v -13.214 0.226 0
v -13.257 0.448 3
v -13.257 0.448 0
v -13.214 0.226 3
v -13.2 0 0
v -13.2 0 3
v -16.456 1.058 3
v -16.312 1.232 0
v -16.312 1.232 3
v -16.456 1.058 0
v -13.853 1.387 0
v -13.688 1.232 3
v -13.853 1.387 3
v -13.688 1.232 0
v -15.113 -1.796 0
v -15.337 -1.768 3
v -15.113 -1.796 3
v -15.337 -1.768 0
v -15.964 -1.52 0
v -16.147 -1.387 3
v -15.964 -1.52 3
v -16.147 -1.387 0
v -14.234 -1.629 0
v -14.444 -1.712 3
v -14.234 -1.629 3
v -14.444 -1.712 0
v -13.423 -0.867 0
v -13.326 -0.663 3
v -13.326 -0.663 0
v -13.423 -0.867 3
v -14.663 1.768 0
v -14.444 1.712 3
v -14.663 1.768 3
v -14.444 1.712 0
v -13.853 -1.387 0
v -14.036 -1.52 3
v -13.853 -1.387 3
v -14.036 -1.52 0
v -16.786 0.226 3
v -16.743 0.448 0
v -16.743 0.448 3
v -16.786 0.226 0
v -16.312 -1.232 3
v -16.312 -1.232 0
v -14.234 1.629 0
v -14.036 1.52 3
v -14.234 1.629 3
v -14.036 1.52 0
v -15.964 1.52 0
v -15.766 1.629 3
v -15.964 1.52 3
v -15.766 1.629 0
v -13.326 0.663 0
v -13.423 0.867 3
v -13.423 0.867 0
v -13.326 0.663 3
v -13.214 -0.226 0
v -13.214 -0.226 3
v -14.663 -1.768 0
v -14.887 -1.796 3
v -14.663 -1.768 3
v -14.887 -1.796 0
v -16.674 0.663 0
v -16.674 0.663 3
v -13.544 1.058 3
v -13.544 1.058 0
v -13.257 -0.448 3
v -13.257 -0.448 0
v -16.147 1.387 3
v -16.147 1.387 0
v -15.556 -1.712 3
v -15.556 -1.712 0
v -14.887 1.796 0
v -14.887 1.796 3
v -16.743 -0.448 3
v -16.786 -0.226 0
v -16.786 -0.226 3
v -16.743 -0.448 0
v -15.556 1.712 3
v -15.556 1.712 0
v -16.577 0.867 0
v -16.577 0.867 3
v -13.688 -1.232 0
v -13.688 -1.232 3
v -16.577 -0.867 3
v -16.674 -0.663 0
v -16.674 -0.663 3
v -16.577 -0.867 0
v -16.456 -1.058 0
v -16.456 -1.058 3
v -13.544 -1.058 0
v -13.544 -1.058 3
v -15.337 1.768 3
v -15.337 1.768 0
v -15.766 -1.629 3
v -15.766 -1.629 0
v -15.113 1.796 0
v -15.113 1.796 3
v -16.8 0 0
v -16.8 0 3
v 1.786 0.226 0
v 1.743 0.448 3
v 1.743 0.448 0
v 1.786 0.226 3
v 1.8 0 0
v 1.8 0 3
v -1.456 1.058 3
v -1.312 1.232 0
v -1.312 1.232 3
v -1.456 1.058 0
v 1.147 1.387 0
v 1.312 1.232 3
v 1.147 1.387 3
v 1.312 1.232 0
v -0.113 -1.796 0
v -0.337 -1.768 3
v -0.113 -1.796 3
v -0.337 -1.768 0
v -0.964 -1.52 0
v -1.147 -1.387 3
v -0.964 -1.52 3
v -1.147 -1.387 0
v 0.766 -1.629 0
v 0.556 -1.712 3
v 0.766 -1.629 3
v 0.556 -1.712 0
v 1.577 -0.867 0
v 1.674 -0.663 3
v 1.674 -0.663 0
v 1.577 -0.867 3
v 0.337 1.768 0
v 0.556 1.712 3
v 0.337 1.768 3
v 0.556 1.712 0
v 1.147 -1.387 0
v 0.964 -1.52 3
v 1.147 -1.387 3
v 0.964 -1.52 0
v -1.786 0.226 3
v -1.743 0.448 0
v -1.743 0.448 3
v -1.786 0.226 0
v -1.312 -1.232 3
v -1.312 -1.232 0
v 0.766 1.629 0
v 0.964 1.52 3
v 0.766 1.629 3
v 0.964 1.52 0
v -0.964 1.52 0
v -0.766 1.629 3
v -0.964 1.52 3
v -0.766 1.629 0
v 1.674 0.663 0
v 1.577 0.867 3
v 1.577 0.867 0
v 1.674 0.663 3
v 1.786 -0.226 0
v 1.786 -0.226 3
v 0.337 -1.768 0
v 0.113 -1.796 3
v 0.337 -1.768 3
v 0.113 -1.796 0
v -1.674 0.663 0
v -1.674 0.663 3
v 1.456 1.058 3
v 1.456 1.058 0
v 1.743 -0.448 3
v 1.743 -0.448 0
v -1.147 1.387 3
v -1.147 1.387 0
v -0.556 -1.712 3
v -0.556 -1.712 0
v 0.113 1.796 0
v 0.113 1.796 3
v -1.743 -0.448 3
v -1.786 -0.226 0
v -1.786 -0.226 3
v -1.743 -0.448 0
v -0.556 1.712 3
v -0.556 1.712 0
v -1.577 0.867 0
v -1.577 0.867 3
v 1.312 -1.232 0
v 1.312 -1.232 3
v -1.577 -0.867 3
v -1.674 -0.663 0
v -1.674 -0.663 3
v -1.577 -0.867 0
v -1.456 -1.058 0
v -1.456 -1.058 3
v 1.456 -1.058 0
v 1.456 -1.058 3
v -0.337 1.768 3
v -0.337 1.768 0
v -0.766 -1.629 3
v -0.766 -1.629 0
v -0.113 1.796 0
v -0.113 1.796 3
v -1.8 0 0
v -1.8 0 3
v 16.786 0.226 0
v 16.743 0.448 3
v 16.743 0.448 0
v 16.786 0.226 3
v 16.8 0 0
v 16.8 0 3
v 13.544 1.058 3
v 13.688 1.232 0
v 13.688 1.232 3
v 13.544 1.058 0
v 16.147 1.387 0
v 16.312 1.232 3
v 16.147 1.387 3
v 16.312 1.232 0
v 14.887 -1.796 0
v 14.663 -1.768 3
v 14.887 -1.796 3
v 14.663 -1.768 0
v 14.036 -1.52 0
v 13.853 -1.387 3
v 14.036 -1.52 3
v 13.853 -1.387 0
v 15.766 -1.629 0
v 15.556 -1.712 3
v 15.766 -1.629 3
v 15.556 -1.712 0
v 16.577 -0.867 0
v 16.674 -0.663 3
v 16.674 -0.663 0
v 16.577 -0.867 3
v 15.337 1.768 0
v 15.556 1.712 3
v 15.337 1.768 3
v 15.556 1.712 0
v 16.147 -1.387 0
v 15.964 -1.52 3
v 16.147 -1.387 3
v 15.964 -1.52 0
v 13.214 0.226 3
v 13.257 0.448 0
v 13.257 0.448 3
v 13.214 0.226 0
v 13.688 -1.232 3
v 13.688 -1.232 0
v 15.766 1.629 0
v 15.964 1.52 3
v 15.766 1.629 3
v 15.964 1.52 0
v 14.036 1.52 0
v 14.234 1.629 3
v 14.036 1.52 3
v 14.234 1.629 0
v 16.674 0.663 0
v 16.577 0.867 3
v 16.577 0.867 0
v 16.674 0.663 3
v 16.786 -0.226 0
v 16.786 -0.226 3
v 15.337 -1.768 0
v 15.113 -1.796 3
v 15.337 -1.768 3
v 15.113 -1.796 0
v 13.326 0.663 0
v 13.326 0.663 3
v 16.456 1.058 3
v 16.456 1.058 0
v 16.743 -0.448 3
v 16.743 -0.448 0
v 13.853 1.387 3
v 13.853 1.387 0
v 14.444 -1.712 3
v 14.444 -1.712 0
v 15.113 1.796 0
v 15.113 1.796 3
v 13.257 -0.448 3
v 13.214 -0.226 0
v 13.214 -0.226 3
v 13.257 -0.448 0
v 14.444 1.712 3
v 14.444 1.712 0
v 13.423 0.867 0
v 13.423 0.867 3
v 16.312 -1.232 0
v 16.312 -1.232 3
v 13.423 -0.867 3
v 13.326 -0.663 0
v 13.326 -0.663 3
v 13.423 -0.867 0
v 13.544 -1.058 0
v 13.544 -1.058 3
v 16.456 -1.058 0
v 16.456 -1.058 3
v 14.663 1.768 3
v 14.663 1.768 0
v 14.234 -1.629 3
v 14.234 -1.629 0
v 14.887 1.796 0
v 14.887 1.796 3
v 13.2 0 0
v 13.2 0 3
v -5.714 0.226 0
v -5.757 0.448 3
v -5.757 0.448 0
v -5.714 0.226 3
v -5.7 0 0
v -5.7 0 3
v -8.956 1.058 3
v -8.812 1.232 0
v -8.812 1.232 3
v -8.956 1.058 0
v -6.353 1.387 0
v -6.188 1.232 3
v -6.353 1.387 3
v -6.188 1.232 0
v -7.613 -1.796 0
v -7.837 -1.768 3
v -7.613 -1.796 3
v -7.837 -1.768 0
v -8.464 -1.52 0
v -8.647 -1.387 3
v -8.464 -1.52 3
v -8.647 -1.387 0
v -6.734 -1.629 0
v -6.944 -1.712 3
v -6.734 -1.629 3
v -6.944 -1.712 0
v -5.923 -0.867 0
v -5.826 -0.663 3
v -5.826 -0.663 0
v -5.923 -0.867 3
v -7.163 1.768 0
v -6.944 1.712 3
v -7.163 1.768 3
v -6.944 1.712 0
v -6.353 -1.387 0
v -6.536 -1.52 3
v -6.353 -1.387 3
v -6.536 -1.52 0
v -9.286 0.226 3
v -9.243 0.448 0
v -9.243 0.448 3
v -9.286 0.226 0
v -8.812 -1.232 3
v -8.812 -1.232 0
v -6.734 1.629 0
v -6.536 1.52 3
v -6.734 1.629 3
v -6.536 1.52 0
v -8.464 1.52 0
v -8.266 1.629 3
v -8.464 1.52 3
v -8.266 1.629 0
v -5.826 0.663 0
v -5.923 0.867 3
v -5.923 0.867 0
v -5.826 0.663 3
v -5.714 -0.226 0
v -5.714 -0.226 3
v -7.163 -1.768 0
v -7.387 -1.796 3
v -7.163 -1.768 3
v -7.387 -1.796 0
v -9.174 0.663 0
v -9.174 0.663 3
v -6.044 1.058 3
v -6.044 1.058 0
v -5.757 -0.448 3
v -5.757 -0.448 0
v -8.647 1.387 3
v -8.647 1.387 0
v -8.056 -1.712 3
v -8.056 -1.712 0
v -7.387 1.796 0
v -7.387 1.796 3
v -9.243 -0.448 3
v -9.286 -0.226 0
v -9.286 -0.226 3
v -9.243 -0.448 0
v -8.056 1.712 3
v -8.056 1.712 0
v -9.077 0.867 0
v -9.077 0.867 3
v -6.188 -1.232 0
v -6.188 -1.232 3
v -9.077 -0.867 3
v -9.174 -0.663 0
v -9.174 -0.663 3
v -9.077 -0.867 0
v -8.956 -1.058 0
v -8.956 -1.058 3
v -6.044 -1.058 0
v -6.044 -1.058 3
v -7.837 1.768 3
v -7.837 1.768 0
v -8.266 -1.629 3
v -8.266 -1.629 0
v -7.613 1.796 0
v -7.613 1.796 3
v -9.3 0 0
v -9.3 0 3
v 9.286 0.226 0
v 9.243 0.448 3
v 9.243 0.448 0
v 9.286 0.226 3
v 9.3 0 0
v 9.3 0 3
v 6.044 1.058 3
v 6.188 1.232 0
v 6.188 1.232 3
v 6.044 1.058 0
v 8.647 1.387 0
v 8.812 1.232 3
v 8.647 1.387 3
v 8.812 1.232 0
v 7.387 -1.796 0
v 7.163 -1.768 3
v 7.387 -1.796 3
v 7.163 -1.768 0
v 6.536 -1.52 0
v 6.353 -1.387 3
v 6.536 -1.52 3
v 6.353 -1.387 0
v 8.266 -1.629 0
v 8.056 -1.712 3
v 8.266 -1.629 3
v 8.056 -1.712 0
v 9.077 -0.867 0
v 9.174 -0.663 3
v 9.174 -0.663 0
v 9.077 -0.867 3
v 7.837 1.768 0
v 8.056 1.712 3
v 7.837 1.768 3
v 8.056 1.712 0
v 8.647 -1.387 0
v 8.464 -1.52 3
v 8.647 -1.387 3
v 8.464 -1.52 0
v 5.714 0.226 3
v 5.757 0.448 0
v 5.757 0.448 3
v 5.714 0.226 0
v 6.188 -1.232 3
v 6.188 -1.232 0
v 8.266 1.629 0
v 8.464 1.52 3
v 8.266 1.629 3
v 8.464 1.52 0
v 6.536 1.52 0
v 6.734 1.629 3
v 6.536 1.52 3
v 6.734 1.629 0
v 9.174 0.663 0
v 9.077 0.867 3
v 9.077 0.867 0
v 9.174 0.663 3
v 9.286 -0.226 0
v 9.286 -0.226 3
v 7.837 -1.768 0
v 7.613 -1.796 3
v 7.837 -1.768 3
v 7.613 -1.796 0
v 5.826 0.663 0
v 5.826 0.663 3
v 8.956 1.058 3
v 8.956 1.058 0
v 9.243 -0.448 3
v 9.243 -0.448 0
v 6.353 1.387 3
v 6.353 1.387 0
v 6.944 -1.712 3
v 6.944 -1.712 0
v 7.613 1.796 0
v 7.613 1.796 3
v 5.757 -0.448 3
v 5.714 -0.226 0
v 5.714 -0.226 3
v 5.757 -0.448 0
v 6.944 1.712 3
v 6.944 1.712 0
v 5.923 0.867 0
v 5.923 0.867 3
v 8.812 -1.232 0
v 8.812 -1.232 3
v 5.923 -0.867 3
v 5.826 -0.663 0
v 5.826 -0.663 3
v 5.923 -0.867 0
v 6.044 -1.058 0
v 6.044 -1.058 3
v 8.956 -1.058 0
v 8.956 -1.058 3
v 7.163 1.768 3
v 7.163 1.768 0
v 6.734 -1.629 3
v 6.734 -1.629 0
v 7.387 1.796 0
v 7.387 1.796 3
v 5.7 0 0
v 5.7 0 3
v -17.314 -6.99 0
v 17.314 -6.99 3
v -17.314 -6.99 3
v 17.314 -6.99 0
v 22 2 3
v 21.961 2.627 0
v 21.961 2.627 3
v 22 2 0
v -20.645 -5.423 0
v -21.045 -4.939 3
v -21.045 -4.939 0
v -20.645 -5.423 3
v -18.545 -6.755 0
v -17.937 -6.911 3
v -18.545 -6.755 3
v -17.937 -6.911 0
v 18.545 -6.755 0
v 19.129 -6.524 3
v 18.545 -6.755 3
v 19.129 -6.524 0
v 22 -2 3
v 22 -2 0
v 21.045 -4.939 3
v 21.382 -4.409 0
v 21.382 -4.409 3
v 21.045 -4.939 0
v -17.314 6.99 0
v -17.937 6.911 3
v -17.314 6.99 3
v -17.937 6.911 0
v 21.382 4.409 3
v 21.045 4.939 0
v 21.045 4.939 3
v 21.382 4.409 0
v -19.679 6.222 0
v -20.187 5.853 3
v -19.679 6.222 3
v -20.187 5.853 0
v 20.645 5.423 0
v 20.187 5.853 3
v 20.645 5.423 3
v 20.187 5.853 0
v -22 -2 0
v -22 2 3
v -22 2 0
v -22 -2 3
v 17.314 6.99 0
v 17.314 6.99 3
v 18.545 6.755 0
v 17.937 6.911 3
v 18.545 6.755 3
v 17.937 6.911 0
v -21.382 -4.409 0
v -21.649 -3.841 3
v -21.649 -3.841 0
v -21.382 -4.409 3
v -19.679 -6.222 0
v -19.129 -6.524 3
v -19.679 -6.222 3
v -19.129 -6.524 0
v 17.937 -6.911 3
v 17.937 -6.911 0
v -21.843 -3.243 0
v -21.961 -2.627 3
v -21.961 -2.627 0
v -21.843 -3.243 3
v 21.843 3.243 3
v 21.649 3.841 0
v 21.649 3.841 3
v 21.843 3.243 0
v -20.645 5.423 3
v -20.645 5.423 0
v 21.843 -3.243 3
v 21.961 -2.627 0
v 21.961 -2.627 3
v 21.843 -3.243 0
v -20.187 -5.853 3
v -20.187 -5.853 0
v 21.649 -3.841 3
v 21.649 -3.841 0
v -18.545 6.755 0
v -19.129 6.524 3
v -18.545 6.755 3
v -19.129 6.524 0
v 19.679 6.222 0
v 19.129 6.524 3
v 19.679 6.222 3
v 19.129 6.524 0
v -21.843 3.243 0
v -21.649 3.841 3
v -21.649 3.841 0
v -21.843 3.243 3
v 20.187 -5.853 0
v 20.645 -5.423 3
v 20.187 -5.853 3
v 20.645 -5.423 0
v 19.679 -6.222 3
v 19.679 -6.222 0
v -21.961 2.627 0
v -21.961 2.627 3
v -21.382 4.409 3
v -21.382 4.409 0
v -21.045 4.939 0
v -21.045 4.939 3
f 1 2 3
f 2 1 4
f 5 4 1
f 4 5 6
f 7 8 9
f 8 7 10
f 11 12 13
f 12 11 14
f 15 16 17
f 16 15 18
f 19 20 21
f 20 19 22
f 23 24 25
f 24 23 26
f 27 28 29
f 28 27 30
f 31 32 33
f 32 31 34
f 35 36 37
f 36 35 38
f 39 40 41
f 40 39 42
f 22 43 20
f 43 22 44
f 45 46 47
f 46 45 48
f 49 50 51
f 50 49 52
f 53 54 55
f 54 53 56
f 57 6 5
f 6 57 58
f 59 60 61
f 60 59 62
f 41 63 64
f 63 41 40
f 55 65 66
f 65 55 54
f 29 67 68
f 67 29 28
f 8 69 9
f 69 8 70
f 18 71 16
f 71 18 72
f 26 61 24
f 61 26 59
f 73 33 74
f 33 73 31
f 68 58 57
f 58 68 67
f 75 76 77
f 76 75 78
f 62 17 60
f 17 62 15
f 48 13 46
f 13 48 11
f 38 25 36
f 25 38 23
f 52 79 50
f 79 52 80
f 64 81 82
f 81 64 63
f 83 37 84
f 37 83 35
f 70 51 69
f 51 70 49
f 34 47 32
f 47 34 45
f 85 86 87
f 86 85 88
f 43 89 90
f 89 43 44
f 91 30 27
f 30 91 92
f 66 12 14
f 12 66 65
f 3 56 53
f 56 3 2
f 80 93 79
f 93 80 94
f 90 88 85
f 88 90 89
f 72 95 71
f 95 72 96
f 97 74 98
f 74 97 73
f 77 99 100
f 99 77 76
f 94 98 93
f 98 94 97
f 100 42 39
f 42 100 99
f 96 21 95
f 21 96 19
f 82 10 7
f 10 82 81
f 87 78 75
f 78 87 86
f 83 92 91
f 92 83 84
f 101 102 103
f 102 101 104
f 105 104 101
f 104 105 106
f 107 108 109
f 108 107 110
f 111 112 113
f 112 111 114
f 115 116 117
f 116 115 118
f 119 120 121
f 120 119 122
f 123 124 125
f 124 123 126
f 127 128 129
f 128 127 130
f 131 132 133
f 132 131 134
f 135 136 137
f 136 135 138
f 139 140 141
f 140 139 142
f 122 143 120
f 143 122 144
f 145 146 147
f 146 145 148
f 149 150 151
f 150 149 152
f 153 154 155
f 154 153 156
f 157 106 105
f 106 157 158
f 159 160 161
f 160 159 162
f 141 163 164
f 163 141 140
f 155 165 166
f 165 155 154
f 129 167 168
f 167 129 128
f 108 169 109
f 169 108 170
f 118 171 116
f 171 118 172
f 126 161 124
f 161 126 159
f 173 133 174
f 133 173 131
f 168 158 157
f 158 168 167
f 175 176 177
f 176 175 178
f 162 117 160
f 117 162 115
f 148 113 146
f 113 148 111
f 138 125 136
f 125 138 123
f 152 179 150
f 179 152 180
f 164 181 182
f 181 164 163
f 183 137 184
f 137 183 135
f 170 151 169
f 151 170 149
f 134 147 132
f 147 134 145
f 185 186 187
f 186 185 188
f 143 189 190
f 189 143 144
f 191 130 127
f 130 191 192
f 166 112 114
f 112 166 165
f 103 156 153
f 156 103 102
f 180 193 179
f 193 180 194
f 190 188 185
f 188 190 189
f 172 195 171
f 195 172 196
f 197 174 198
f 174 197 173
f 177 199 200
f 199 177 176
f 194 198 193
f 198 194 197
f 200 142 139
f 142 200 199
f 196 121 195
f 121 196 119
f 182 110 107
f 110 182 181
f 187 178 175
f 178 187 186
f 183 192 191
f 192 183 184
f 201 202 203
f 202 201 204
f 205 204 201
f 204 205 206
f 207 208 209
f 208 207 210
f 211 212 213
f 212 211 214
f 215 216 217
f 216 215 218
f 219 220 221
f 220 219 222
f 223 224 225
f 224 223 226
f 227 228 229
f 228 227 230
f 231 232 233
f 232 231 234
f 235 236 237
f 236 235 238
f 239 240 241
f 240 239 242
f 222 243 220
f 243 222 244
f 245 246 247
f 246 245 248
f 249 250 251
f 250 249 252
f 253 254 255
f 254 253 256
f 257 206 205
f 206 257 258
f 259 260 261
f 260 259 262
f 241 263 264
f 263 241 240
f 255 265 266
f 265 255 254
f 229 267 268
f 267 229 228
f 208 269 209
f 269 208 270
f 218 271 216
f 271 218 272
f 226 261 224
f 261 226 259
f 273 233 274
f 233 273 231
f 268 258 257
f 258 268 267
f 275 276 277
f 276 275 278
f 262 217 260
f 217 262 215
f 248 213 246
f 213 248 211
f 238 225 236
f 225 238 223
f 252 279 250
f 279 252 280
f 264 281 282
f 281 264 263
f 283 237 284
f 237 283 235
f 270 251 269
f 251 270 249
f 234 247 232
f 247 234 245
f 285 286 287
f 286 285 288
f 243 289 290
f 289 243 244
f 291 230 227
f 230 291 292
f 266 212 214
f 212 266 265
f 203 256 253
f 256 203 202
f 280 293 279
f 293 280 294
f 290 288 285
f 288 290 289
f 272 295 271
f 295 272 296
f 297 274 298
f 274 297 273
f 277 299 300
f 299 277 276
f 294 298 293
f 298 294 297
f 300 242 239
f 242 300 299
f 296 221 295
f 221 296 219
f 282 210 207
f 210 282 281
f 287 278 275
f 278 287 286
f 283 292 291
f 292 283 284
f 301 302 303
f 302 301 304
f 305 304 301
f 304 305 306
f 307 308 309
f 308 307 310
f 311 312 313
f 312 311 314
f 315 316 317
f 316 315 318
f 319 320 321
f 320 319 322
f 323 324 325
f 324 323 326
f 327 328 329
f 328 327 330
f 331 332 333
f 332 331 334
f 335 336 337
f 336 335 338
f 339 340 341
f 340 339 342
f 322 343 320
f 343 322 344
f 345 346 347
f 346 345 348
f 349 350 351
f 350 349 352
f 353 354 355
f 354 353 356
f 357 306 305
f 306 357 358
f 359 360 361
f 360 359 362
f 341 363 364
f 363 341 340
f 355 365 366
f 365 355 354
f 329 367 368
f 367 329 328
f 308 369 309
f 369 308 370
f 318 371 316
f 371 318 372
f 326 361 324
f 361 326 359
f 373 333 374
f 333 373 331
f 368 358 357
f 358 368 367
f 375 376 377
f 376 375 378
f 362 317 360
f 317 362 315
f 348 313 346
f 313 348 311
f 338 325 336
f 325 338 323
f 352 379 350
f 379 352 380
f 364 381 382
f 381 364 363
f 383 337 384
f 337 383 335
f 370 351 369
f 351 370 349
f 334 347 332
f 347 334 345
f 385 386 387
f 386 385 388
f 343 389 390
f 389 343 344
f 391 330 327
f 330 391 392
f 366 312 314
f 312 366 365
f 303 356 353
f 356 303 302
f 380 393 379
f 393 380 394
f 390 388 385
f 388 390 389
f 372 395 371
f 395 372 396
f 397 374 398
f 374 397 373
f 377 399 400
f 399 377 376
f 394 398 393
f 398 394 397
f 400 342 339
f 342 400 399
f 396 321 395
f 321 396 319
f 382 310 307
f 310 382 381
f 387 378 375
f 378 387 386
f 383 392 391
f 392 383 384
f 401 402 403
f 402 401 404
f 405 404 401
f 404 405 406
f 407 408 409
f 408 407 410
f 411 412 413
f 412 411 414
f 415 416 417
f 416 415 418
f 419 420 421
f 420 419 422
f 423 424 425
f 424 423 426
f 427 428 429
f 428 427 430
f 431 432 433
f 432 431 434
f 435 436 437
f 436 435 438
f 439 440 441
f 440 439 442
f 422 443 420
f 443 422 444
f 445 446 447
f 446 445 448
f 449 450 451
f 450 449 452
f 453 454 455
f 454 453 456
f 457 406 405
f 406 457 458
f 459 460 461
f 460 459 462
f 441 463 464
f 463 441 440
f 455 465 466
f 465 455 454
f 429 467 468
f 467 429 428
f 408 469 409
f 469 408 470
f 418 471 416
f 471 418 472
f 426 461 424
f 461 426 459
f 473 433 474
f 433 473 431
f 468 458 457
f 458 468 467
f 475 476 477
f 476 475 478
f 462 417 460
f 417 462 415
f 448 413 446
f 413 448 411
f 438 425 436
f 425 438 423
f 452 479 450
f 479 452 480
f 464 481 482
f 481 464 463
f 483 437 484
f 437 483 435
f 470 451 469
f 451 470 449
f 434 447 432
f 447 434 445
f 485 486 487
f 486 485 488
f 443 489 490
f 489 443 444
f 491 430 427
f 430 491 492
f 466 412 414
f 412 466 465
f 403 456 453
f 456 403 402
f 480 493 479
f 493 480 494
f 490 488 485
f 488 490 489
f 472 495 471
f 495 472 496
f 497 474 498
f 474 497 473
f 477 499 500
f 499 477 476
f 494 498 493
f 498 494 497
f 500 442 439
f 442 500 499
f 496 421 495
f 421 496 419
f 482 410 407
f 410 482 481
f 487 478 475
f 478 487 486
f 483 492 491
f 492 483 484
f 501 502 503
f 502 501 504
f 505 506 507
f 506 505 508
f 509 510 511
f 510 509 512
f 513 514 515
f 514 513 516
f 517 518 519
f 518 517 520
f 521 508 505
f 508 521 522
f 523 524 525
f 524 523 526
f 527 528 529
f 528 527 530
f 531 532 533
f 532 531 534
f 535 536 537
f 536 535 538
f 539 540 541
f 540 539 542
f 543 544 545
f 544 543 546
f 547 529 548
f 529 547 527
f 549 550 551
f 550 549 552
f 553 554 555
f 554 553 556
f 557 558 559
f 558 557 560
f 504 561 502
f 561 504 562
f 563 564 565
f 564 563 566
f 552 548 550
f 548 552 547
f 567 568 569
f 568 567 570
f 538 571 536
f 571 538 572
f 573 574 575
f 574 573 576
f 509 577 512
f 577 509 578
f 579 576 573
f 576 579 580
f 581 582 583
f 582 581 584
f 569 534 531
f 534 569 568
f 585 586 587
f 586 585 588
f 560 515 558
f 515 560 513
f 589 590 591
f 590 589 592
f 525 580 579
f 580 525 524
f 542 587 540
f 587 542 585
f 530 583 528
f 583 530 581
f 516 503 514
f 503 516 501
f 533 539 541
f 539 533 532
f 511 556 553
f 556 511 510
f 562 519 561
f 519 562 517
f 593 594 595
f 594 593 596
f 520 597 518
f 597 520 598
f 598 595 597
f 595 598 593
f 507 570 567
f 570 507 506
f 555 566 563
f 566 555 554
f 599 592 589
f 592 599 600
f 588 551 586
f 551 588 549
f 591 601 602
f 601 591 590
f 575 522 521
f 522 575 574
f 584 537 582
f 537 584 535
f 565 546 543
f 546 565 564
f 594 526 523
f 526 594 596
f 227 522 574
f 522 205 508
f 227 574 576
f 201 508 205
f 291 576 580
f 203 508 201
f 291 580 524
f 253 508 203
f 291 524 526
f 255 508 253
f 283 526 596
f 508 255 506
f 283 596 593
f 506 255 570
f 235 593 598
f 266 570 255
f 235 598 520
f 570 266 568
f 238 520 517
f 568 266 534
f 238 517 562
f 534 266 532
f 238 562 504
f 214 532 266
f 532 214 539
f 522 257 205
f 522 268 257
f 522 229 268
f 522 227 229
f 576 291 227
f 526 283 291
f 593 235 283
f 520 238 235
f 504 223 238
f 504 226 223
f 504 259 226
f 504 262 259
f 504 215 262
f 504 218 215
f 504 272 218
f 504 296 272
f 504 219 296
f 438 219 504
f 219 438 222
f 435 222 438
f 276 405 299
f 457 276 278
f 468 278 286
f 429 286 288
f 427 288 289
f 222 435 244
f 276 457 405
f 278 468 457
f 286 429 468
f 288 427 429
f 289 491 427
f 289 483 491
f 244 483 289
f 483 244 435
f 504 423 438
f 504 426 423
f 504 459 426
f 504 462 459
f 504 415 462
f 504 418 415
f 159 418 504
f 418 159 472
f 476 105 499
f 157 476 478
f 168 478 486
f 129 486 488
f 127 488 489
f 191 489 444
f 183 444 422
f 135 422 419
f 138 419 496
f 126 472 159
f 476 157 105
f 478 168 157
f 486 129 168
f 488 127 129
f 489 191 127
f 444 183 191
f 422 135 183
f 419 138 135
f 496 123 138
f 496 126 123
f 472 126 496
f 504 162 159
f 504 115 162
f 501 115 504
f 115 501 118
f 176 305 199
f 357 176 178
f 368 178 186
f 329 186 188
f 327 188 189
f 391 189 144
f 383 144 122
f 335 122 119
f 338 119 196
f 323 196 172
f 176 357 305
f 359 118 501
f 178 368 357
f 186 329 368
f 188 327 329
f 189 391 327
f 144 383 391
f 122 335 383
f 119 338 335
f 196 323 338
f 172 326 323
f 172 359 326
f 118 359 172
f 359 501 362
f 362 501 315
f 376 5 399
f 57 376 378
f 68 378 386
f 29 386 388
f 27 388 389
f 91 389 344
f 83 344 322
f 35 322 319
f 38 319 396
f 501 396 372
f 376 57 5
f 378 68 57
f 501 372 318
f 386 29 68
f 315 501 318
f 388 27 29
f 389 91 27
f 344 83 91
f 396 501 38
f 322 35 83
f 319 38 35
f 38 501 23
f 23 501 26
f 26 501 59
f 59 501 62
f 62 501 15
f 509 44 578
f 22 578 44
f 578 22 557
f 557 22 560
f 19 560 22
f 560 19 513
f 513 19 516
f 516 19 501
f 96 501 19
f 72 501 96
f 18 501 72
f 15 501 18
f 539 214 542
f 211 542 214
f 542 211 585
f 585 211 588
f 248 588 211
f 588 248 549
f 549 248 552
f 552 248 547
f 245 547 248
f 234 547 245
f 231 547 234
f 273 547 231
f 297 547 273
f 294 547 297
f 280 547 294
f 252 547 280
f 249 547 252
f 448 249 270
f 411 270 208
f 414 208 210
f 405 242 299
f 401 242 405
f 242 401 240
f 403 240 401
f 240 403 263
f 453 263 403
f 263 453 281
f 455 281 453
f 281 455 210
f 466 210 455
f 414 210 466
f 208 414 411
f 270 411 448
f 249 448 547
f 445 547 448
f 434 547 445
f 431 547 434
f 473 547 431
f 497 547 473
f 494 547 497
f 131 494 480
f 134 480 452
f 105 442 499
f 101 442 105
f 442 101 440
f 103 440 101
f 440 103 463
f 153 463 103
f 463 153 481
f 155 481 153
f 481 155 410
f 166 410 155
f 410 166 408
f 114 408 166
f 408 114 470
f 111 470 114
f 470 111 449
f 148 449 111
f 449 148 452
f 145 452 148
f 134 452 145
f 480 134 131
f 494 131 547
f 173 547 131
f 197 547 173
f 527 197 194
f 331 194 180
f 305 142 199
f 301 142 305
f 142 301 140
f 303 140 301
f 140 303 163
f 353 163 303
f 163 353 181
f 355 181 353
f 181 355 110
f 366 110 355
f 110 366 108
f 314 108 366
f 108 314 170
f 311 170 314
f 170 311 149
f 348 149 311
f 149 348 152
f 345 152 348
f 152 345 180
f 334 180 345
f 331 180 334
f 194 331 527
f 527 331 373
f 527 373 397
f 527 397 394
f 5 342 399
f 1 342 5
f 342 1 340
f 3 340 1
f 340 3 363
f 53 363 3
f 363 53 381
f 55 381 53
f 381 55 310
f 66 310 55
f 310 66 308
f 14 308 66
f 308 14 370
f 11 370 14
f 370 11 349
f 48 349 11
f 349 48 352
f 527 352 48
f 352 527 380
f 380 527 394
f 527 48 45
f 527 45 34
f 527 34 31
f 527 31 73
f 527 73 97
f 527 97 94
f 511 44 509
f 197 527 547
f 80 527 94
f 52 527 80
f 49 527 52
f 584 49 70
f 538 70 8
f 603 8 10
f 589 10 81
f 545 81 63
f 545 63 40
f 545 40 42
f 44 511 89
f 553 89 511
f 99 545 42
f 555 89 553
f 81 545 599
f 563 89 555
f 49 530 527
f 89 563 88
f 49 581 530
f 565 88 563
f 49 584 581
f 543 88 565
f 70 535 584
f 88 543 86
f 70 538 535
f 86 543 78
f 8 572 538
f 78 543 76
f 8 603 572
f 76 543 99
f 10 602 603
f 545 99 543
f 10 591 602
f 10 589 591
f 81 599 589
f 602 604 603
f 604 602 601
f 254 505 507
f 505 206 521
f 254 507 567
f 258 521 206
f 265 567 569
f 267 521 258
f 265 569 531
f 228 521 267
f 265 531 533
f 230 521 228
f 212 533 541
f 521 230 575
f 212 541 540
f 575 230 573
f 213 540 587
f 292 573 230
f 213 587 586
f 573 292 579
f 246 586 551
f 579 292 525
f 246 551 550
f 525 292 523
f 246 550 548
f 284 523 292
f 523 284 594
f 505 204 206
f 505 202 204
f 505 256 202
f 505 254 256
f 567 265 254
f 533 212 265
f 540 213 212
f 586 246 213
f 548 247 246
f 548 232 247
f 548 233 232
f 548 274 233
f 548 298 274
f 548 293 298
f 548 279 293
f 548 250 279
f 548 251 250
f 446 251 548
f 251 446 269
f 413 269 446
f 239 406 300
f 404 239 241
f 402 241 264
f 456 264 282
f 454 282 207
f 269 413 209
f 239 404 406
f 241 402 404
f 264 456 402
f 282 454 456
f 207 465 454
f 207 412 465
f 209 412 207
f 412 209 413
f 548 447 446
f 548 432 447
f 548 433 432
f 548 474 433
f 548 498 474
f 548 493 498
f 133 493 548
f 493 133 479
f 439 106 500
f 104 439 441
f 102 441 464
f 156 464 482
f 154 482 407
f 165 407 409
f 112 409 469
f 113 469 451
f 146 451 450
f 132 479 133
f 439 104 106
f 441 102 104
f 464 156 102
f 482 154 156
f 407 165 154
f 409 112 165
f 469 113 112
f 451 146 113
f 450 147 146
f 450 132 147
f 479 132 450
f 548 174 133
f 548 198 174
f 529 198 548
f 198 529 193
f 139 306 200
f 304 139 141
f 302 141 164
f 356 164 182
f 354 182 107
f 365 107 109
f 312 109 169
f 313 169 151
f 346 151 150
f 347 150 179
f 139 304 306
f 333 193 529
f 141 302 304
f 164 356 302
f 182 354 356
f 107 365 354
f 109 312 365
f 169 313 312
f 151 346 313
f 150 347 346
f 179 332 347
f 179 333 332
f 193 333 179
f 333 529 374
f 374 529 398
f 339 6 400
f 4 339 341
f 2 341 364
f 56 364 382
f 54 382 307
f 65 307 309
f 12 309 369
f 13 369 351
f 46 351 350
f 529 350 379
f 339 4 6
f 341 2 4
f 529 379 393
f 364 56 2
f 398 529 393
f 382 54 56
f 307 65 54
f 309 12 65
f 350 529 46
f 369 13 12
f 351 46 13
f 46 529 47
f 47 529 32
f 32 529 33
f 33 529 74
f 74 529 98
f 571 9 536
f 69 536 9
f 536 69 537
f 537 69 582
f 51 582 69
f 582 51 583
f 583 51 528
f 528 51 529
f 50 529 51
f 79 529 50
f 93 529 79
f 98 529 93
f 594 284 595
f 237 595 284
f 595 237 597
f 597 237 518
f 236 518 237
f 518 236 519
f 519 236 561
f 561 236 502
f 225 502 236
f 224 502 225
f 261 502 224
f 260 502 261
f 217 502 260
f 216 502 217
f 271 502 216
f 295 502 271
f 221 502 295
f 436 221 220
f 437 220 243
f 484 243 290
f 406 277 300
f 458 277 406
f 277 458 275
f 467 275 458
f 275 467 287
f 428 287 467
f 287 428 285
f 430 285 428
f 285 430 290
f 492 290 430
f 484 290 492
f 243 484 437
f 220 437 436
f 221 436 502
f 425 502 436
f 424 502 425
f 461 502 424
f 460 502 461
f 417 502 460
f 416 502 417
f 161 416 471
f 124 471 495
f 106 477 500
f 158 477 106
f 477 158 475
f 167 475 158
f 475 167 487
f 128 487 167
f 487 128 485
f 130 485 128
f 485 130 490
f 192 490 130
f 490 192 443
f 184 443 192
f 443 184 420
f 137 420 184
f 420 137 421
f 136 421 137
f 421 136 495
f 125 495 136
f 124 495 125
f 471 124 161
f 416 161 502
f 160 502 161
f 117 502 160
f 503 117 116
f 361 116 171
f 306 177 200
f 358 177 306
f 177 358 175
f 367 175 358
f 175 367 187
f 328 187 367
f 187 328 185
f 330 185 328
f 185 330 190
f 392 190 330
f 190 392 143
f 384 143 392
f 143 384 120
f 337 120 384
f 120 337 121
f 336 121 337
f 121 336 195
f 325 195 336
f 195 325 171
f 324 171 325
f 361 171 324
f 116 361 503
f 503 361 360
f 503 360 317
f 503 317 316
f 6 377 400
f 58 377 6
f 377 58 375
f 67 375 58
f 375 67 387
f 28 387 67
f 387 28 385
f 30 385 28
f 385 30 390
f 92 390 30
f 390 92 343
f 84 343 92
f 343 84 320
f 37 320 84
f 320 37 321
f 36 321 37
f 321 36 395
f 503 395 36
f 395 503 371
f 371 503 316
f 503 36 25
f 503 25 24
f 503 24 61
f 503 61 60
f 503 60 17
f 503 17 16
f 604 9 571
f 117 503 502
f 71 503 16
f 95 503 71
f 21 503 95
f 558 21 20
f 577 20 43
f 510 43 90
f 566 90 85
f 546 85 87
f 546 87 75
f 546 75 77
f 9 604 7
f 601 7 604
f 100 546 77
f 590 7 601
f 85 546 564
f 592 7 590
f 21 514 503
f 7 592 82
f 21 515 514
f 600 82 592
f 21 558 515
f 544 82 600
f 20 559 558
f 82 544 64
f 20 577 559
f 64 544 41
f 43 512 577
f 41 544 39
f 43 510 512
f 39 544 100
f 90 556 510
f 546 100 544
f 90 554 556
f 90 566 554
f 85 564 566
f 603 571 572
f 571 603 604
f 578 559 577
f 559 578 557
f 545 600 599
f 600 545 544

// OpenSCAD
$fn = 50;


difference() {
	union() {
		hull() {
			translate(v = [-17.0000000000, 2.0000000000, 0]) {
				cylinder(h = 3, r = 5);
			}
			translate(v = [17.0000000000, 2.0000000000, 0]) {
				cylinder(h = 3, r = 5);
			}
			translate(v = [-17.0000000000, -2.0000000000, 0]) {
				cylinder(h = 3, r = 5);
			}
			translate(v = [17.0000000000, -2.0000000000, 0]) {
				cylinder(h = 3, r = 5);
			}
		}
	}
	union() {
		translate(v = [-15.0000000000, 0.0000000000, 0]) {
			translate(v = [0, 0, -100]) {
				cylinder(h = 200, r = 1.8000000000);
			}
		}
		translate(v = [0, 0, -100]) {
			cylinder(h = 200, r = 1.8000000000);
		}
		translate(v = [15.0000000000, 0.0000000000, 0]) {
			translate(v = [0, 0, -100]) {
				cylinder(h = 200, r = 1.8000000000);
			}
		}
		translate(v = [-15.0000000000, 0.0000000000, 0]) {
			translate(v = [0, 0, -100]) {
				cylinder(h = 200, r = 1.8000000000);
			}
		}
		translate(v = [-7.5000000000, 0.0000000000, 0]) {
			translate(v = [0, 0, -100]) {
				cylinder(h = 200, r = 1.8000000000);
			}
		}
		translate(v = [0, 0, -100]) {
			cylinder(h = 200, r = 1.8000000000);
		}
		translate(v = [7.5000000000, 0.0000000000, 0]) {
			translate(v = [0, 0, -100]) {
				cylinder(h = 200, r = 1.8000000000);
			}
		}
		translate(v = [15.0000000000, 0.0000000000, 0]) {
			translate(v = [0, 0, -100]) {
				cylinder(h = 200, r = 1.8000000000);
			}
		}
	}
}
